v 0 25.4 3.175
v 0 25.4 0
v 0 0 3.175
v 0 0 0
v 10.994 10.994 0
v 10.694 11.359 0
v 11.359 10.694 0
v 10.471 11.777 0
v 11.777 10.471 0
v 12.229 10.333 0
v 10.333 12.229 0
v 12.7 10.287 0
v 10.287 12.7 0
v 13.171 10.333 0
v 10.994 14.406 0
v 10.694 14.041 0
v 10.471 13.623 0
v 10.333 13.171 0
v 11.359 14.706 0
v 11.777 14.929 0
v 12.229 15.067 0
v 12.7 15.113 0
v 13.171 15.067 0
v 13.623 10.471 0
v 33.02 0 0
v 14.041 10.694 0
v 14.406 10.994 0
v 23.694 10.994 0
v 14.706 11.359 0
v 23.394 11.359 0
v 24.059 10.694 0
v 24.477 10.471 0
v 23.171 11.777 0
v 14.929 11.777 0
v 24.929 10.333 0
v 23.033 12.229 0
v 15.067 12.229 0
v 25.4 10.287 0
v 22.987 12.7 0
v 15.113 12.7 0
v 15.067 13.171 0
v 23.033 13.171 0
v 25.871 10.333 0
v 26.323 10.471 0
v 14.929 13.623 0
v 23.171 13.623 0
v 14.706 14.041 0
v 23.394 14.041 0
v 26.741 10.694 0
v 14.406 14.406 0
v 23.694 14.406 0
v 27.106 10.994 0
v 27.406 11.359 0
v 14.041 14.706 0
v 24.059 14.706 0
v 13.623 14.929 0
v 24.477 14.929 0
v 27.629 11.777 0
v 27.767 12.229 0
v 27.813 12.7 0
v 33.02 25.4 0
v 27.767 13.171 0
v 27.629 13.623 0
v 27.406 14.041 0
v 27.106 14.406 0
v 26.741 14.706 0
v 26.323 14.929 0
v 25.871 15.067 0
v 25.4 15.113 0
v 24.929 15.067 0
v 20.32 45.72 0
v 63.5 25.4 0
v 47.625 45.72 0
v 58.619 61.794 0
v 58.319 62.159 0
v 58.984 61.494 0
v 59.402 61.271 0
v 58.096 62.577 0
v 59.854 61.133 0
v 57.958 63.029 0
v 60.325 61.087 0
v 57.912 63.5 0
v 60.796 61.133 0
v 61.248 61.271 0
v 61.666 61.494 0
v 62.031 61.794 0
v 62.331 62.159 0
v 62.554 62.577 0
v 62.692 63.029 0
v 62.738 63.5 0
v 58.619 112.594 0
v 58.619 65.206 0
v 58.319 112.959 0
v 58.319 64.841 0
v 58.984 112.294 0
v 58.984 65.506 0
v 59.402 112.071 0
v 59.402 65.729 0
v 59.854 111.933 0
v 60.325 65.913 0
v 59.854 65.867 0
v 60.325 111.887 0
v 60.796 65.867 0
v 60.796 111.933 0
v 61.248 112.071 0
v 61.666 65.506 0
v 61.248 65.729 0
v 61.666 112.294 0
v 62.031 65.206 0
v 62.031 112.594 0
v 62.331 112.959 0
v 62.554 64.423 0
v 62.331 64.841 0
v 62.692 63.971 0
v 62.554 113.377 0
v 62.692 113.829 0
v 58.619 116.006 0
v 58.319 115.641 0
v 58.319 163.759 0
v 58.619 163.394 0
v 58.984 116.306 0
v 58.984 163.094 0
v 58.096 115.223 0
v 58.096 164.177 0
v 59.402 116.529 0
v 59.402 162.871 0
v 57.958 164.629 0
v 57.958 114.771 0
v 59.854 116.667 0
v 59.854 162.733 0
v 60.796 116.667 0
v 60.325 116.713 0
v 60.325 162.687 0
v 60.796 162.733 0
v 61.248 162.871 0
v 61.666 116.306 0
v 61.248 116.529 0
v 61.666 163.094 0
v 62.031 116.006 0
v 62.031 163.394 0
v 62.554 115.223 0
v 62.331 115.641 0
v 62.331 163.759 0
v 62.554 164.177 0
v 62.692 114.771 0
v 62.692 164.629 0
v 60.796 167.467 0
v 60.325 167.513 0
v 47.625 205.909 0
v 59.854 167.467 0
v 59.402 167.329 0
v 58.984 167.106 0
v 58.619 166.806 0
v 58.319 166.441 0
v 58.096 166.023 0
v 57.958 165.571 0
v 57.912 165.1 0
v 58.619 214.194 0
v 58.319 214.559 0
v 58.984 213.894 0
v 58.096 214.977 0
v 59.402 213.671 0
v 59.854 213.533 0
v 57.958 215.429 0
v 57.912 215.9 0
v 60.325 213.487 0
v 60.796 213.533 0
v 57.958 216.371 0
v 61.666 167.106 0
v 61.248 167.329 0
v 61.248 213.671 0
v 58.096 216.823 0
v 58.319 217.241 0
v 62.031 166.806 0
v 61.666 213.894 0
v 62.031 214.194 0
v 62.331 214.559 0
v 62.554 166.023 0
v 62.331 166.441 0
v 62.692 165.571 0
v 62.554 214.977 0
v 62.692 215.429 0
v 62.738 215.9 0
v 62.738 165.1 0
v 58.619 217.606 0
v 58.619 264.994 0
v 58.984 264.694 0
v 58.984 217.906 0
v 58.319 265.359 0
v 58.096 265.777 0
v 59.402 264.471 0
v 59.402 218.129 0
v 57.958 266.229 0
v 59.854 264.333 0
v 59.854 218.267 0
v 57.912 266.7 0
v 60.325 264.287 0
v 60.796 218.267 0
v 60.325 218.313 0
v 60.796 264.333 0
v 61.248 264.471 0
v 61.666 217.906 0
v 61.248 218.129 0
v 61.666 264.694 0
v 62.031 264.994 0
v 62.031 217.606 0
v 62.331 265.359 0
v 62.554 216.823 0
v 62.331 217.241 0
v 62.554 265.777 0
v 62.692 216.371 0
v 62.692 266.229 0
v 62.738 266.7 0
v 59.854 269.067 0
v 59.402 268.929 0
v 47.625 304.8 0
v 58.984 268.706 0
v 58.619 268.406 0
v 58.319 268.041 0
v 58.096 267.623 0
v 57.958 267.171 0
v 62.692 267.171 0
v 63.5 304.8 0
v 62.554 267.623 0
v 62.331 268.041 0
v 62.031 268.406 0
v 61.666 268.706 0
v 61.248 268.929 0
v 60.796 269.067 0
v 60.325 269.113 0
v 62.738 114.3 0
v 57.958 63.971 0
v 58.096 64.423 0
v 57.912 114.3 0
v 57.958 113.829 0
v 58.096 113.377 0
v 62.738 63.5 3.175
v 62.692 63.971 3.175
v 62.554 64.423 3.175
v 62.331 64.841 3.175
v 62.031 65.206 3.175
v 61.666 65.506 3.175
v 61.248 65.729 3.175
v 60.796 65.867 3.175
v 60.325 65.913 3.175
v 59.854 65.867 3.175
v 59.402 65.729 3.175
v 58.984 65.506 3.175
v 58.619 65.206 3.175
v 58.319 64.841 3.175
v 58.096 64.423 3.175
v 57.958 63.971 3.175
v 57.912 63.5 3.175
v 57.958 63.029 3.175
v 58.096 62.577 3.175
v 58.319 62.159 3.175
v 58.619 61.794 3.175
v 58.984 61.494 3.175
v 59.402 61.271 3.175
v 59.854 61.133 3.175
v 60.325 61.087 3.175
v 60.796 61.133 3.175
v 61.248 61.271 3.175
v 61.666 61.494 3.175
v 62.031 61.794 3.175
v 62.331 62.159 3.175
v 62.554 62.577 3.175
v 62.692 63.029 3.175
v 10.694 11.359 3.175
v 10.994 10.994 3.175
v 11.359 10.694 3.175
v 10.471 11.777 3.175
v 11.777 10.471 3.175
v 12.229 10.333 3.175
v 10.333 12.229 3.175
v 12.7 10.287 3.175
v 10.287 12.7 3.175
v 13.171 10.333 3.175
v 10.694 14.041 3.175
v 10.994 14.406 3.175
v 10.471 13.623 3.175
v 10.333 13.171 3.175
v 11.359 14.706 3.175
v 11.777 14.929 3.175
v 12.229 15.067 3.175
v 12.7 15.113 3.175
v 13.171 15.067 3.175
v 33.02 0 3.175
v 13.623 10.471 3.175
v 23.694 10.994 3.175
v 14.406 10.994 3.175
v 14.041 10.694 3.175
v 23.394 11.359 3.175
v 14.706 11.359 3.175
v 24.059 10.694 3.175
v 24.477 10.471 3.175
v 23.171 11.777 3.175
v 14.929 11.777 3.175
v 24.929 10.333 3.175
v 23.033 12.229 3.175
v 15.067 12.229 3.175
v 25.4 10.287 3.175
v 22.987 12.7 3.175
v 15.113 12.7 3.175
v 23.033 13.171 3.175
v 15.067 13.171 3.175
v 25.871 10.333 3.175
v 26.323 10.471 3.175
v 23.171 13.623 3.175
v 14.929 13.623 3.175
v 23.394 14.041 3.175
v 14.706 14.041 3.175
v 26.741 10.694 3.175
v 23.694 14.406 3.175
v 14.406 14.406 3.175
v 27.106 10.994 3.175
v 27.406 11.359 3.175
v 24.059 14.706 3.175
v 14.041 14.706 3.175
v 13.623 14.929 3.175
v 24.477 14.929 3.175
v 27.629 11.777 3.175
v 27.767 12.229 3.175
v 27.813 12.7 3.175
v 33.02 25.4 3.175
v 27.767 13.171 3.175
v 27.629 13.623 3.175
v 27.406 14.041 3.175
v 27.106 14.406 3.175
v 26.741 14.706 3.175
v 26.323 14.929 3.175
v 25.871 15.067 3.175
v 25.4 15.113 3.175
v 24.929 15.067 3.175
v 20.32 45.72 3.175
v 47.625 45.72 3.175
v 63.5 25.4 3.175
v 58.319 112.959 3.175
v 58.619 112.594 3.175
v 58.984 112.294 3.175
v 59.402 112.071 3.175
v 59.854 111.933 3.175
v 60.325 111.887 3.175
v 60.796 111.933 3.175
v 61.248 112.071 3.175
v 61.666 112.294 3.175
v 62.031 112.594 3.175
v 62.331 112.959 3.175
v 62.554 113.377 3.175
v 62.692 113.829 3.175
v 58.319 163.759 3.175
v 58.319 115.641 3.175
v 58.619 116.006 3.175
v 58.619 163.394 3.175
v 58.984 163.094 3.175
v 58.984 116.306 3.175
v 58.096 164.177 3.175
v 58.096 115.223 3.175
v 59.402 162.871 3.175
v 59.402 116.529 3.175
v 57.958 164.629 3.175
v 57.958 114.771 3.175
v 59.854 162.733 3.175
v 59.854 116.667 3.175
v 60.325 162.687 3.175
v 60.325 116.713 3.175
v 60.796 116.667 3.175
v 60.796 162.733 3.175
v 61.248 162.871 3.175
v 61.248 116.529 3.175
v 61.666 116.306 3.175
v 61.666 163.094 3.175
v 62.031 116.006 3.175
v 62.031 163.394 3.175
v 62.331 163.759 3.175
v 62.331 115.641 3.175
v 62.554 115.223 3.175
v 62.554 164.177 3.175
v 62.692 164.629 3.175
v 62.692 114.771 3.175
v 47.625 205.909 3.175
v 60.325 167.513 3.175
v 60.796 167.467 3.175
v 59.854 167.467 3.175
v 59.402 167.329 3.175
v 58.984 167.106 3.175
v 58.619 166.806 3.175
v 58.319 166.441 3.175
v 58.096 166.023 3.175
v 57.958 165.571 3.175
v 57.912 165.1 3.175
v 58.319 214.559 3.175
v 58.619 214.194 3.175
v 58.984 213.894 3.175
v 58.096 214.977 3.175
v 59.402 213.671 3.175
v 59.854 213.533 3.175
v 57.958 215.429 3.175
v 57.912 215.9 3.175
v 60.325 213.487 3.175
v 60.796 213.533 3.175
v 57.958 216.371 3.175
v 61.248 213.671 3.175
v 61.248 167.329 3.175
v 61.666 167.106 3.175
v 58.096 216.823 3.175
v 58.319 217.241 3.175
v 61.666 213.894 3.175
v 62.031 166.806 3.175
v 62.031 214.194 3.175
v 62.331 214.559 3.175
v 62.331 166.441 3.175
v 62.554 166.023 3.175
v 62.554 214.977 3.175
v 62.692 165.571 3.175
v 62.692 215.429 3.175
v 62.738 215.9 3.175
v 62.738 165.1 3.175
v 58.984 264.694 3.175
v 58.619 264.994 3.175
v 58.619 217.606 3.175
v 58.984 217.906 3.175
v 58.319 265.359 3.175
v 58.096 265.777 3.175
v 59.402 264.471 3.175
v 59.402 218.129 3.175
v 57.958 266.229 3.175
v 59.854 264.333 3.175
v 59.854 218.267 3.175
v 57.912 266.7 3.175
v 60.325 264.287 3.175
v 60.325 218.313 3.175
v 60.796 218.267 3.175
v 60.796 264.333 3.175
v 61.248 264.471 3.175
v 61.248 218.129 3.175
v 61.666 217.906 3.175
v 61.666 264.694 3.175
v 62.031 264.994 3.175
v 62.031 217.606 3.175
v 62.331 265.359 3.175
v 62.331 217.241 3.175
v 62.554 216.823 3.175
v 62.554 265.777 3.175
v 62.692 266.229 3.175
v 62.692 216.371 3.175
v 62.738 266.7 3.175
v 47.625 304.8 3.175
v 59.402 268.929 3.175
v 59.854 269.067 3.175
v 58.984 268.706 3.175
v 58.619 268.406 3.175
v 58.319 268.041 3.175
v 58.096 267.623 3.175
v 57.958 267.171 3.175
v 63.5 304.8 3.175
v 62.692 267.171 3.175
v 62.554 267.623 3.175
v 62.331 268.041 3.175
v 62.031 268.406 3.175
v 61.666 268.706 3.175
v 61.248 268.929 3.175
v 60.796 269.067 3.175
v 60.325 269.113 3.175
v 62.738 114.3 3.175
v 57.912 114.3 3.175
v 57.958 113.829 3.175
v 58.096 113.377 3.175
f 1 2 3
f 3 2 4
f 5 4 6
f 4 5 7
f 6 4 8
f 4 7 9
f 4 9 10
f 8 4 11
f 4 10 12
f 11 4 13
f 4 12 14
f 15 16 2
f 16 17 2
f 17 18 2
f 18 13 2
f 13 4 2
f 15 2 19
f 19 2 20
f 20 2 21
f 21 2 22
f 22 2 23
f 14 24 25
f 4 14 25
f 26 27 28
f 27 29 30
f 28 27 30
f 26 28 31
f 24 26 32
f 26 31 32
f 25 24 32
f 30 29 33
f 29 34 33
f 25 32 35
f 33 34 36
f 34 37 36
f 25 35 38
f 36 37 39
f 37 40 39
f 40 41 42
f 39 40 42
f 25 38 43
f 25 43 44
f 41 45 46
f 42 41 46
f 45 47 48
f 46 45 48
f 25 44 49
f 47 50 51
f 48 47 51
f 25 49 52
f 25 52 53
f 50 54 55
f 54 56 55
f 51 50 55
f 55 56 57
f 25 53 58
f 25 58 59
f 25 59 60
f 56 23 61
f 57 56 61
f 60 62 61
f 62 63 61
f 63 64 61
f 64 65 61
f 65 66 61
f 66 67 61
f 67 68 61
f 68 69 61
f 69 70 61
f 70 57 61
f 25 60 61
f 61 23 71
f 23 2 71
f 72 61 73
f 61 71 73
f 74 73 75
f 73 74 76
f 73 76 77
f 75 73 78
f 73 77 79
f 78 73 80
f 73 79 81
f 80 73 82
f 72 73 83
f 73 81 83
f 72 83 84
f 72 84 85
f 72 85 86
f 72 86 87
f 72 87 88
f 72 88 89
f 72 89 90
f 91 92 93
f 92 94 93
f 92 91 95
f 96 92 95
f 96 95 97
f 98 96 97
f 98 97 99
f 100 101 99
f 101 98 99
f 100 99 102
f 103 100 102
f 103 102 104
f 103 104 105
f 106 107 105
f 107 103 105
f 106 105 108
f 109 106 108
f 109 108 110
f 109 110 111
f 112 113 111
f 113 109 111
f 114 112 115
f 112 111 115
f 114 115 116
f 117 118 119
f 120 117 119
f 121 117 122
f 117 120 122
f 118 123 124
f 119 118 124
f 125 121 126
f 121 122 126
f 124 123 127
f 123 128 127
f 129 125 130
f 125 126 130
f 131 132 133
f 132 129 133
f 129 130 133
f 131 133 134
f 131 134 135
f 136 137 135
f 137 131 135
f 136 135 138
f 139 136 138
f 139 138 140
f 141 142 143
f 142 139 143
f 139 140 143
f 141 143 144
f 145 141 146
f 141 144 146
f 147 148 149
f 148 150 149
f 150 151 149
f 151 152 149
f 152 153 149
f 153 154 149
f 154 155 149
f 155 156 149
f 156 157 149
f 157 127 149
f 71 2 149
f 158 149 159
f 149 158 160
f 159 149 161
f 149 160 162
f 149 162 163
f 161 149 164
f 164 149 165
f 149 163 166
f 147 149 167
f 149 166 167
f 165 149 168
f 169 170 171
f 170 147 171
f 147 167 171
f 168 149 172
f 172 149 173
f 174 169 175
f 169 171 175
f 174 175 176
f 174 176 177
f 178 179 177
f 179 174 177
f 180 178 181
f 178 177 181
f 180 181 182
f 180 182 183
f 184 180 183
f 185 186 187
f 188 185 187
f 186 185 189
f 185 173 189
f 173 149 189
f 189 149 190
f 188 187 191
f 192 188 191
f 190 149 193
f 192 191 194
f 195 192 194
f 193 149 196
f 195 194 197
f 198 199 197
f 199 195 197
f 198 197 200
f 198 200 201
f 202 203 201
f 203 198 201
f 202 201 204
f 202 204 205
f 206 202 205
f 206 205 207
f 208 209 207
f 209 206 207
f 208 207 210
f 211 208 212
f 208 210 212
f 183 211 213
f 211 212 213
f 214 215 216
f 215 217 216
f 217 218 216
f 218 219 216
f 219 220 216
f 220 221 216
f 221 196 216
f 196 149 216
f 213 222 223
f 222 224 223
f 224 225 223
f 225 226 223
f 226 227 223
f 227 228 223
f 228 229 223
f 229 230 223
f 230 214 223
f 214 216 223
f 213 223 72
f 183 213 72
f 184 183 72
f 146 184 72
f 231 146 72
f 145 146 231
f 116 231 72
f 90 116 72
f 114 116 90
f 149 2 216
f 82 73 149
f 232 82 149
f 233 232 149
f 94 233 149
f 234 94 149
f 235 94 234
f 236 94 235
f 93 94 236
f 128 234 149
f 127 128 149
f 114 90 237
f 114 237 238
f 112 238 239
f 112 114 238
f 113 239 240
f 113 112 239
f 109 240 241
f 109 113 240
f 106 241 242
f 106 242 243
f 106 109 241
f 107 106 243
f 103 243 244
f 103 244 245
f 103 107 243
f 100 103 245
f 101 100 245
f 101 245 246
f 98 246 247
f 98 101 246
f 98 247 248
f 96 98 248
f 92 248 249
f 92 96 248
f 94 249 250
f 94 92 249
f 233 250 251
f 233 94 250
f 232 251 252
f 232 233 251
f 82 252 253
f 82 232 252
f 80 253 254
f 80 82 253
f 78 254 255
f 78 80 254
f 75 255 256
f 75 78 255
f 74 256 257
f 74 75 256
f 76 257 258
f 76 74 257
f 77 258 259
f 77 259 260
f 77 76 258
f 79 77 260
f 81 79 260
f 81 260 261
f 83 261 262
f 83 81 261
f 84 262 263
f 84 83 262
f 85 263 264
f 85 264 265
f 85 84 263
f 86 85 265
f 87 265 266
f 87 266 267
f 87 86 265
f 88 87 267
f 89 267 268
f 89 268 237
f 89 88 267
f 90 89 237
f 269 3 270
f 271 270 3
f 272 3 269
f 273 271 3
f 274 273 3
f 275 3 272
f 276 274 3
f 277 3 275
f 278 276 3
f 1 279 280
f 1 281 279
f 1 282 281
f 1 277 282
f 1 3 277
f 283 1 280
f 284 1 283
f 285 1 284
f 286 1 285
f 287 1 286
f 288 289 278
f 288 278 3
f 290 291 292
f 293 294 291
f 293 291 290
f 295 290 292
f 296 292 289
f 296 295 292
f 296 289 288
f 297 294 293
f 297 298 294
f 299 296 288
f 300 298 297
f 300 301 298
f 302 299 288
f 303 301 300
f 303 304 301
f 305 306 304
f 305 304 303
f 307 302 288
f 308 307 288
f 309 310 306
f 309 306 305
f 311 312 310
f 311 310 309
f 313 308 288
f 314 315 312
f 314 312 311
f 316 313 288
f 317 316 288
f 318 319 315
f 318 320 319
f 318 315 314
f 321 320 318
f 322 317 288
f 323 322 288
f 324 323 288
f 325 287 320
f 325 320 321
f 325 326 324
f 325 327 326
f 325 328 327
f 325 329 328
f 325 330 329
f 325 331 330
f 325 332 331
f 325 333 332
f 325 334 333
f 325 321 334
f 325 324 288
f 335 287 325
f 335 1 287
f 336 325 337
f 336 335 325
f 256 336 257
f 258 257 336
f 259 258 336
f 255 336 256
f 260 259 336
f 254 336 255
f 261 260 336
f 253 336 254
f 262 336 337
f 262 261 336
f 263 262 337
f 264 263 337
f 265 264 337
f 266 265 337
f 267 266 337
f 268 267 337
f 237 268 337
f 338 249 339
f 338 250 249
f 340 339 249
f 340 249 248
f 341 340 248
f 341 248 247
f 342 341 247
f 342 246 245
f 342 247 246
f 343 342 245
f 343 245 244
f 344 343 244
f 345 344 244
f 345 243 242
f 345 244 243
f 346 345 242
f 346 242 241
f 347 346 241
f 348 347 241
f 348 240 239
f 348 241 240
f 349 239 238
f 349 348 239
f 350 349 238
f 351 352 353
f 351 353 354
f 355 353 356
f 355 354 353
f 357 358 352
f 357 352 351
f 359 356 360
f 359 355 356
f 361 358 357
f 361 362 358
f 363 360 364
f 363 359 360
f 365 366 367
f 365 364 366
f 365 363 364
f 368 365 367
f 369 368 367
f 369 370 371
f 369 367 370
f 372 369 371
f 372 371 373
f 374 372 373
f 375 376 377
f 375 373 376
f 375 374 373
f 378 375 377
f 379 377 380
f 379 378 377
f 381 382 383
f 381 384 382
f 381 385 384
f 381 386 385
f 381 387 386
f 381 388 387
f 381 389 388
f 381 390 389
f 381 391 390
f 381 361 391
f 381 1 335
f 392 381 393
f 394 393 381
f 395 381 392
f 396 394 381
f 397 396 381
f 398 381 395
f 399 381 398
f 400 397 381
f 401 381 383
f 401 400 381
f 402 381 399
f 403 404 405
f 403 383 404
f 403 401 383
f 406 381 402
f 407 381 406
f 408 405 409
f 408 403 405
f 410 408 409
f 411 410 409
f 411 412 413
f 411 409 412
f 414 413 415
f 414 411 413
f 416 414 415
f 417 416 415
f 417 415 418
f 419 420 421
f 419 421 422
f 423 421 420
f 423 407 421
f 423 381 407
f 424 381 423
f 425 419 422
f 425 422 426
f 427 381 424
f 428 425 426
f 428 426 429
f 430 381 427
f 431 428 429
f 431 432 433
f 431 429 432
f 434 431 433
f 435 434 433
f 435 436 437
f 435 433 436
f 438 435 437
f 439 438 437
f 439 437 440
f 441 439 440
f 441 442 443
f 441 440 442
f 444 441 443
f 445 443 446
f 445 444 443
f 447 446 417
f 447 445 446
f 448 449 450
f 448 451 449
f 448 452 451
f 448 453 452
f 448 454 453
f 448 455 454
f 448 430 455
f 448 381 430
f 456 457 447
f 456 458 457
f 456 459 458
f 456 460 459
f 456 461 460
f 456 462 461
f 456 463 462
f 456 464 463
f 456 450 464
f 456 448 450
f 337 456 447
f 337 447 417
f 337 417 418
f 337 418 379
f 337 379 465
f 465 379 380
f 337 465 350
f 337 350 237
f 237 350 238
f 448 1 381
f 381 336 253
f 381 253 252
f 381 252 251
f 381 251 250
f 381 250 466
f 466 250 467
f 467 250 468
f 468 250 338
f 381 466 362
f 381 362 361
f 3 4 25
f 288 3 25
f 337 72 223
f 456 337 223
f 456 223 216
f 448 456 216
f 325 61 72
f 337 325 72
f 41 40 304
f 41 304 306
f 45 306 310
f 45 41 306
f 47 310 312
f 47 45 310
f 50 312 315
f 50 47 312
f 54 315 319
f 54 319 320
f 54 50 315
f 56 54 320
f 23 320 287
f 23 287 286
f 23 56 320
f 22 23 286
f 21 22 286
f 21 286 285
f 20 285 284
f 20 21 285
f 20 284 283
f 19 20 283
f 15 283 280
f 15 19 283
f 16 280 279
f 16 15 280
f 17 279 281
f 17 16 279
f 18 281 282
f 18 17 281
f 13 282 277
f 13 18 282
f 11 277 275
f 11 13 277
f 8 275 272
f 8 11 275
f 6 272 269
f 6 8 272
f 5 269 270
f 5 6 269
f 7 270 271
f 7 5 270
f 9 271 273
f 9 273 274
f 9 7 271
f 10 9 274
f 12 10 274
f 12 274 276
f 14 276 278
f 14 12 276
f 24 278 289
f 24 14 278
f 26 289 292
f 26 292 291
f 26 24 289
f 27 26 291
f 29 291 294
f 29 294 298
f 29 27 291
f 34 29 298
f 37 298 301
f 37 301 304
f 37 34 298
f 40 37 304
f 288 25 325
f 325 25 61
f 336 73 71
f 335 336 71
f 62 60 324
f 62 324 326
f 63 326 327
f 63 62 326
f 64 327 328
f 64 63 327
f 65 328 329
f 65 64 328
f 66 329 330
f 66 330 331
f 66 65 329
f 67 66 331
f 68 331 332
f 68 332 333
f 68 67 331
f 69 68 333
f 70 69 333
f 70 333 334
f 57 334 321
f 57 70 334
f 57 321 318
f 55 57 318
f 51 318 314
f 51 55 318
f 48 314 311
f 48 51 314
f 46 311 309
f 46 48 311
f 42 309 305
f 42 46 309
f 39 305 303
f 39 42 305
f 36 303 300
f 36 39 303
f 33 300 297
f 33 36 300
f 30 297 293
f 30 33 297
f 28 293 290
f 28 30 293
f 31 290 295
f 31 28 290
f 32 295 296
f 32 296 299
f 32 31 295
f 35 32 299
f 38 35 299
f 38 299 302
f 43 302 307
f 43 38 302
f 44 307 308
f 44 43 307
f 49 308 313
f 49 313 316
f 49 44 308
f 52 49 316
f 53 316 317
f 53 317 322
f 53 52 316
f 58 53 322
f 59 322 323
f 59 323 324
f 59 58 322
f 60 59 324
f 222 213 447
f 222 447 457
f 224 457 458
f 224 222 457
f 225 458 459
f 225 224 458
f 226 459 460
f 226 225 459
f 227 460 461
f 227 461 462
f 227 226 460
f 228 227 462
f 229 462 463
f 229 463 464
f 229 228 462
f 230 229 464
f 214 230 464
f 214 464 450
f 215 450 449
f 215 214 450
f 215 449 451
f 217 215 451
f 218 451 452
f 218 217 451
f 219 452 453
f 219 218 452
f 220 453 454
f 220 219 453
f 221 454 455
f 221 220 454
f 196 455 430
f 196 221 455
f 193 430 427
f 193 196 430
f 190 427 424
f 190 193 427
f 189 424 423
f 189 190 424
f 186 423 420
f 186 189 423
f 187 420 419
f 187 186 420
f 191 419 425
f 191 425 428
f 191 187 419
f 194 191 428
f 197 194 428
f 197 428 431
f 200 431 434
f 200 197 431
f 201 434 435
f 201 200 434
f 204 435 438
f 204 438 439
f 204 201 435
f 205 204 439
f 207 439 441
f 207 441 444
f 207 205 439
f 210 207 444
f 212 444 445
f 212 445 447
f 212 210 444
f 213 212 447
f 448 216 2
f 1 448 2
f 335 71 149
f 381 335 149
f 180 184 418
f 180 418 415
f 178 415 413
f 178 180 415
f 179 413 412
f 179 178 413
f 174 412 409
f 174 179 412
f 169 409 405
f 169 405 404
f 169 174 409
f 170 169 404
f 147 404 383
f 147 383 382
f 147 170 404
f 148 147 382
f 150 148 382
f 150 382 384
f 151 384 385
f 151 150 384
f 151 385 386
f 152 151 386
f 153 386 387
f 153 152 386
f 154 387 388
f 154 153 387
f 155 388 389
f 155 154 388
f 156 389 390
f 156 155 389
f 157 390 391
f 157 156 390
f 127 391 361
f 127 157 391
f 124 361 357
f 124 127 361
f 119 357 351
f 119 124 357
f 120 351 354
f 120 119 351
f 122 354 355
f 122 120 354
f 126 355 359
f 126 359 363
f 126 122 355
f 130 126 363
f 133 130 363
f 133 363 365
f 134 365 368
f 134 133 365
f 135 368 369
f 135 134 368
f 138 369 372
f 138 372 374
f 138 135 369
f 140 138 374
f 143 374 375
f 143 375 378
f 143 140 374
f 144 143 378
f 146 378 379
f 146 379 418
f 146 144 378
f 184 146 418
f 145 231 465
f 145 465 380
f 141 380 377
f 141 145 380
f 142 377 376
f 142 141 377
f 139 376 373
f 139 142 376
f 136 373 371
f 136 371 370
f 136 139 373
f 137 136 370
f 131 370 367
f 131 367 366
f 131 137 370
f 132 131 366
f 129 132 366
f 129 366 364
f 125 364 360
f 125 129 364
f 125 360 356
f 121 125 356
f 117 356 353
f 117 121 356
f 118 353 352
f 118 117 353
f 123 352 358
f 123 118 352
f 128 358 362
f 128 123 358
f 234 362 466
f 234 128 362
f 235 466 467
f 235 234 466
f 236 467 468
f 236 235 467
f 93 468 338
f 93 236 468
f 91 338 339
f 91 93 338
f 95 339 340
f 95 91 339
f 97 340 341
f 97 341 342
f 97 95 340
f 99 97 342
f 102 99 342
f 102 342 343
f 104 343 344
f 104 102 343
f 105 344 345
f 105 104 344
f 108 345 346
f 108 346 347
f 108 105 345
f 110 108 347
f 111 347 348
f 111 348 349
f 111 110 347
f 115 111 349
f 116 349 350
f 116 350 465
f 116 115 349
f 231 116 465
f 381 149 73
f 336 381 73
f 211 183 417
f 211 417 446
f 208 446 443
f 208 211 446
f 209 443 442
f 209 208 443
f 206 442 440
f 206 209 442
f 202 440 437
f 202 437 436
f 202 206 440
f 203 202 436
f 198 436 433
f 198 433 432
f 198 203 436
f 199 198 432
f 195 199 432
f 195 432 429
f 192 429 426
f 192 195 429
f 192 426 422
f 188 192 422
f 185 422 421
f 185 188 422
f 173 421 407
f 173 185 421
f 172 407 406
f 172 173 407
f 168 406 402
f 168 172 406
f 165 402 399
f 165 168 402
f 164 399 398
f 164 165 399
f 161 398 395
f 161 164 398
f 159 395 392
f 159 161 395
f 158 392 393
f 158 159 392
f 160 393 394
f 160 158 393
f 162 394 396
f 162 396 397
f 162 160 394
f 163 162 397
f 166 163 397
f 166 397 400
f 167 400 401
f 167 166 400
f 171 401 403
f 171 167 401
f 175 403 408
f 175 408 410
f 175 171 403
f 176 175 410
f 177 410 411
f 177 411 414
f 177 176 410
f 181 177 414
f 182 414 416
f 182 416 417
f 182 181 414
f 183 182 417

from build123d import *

# Parameters (mm, degrees)
SKETCH1_R           = 2.413
BOSS_EXTRUDE1_DEPTH = 3.175


with BuildPart() as part:
    # Sketch1 → Boss-Extrude1 (new body)
    with BuildSketch(Plane.XY):
        Polygon((0, 0), (33.02, 0), (33.02, 25.4), (63.5, 25.4), (63.5, 304.8), (47.625, 304.8), (0, 25.4), align=None)
        with Locations((12.7, 12.7)):
            Circle(SKETCH1_R, mode=Mode.SUBTRACT)
        with Locations((25.4, 12.7)):
            Circle(SKETCH1_R, mode=Mode.SUBTRACT)
        with Locations((60.325, 63.5)):
            Circle(SKETCH1_R, mode=Mode.SUBTRACT)
        with Locations((60.325, 114.3)):
            Circle(SKETCH1_R, mode=Mode.SUBTRACT)
        with Locations((60.325, 165.1)):
            Circle(SKETCH1_R, mode=Mode.SUBTRACT)
        with Locations((60.325, 215.9)):
            Circle(SKETCH1_R, mode=Mode.SUBTRACT)
        with Locations((60.325, 266.7)):
            Circle(SKETCH1_R, mode=Mode.SUBTRACT)
        Polygon((47.625, 205.909333333), (47.625, 45.72), (20.32, 45.72), align=None, mode=Mode.SUBTRACT)
    extrude(amount=BOSS_EXTRUDE1_DEPTH)


solid = part.part
